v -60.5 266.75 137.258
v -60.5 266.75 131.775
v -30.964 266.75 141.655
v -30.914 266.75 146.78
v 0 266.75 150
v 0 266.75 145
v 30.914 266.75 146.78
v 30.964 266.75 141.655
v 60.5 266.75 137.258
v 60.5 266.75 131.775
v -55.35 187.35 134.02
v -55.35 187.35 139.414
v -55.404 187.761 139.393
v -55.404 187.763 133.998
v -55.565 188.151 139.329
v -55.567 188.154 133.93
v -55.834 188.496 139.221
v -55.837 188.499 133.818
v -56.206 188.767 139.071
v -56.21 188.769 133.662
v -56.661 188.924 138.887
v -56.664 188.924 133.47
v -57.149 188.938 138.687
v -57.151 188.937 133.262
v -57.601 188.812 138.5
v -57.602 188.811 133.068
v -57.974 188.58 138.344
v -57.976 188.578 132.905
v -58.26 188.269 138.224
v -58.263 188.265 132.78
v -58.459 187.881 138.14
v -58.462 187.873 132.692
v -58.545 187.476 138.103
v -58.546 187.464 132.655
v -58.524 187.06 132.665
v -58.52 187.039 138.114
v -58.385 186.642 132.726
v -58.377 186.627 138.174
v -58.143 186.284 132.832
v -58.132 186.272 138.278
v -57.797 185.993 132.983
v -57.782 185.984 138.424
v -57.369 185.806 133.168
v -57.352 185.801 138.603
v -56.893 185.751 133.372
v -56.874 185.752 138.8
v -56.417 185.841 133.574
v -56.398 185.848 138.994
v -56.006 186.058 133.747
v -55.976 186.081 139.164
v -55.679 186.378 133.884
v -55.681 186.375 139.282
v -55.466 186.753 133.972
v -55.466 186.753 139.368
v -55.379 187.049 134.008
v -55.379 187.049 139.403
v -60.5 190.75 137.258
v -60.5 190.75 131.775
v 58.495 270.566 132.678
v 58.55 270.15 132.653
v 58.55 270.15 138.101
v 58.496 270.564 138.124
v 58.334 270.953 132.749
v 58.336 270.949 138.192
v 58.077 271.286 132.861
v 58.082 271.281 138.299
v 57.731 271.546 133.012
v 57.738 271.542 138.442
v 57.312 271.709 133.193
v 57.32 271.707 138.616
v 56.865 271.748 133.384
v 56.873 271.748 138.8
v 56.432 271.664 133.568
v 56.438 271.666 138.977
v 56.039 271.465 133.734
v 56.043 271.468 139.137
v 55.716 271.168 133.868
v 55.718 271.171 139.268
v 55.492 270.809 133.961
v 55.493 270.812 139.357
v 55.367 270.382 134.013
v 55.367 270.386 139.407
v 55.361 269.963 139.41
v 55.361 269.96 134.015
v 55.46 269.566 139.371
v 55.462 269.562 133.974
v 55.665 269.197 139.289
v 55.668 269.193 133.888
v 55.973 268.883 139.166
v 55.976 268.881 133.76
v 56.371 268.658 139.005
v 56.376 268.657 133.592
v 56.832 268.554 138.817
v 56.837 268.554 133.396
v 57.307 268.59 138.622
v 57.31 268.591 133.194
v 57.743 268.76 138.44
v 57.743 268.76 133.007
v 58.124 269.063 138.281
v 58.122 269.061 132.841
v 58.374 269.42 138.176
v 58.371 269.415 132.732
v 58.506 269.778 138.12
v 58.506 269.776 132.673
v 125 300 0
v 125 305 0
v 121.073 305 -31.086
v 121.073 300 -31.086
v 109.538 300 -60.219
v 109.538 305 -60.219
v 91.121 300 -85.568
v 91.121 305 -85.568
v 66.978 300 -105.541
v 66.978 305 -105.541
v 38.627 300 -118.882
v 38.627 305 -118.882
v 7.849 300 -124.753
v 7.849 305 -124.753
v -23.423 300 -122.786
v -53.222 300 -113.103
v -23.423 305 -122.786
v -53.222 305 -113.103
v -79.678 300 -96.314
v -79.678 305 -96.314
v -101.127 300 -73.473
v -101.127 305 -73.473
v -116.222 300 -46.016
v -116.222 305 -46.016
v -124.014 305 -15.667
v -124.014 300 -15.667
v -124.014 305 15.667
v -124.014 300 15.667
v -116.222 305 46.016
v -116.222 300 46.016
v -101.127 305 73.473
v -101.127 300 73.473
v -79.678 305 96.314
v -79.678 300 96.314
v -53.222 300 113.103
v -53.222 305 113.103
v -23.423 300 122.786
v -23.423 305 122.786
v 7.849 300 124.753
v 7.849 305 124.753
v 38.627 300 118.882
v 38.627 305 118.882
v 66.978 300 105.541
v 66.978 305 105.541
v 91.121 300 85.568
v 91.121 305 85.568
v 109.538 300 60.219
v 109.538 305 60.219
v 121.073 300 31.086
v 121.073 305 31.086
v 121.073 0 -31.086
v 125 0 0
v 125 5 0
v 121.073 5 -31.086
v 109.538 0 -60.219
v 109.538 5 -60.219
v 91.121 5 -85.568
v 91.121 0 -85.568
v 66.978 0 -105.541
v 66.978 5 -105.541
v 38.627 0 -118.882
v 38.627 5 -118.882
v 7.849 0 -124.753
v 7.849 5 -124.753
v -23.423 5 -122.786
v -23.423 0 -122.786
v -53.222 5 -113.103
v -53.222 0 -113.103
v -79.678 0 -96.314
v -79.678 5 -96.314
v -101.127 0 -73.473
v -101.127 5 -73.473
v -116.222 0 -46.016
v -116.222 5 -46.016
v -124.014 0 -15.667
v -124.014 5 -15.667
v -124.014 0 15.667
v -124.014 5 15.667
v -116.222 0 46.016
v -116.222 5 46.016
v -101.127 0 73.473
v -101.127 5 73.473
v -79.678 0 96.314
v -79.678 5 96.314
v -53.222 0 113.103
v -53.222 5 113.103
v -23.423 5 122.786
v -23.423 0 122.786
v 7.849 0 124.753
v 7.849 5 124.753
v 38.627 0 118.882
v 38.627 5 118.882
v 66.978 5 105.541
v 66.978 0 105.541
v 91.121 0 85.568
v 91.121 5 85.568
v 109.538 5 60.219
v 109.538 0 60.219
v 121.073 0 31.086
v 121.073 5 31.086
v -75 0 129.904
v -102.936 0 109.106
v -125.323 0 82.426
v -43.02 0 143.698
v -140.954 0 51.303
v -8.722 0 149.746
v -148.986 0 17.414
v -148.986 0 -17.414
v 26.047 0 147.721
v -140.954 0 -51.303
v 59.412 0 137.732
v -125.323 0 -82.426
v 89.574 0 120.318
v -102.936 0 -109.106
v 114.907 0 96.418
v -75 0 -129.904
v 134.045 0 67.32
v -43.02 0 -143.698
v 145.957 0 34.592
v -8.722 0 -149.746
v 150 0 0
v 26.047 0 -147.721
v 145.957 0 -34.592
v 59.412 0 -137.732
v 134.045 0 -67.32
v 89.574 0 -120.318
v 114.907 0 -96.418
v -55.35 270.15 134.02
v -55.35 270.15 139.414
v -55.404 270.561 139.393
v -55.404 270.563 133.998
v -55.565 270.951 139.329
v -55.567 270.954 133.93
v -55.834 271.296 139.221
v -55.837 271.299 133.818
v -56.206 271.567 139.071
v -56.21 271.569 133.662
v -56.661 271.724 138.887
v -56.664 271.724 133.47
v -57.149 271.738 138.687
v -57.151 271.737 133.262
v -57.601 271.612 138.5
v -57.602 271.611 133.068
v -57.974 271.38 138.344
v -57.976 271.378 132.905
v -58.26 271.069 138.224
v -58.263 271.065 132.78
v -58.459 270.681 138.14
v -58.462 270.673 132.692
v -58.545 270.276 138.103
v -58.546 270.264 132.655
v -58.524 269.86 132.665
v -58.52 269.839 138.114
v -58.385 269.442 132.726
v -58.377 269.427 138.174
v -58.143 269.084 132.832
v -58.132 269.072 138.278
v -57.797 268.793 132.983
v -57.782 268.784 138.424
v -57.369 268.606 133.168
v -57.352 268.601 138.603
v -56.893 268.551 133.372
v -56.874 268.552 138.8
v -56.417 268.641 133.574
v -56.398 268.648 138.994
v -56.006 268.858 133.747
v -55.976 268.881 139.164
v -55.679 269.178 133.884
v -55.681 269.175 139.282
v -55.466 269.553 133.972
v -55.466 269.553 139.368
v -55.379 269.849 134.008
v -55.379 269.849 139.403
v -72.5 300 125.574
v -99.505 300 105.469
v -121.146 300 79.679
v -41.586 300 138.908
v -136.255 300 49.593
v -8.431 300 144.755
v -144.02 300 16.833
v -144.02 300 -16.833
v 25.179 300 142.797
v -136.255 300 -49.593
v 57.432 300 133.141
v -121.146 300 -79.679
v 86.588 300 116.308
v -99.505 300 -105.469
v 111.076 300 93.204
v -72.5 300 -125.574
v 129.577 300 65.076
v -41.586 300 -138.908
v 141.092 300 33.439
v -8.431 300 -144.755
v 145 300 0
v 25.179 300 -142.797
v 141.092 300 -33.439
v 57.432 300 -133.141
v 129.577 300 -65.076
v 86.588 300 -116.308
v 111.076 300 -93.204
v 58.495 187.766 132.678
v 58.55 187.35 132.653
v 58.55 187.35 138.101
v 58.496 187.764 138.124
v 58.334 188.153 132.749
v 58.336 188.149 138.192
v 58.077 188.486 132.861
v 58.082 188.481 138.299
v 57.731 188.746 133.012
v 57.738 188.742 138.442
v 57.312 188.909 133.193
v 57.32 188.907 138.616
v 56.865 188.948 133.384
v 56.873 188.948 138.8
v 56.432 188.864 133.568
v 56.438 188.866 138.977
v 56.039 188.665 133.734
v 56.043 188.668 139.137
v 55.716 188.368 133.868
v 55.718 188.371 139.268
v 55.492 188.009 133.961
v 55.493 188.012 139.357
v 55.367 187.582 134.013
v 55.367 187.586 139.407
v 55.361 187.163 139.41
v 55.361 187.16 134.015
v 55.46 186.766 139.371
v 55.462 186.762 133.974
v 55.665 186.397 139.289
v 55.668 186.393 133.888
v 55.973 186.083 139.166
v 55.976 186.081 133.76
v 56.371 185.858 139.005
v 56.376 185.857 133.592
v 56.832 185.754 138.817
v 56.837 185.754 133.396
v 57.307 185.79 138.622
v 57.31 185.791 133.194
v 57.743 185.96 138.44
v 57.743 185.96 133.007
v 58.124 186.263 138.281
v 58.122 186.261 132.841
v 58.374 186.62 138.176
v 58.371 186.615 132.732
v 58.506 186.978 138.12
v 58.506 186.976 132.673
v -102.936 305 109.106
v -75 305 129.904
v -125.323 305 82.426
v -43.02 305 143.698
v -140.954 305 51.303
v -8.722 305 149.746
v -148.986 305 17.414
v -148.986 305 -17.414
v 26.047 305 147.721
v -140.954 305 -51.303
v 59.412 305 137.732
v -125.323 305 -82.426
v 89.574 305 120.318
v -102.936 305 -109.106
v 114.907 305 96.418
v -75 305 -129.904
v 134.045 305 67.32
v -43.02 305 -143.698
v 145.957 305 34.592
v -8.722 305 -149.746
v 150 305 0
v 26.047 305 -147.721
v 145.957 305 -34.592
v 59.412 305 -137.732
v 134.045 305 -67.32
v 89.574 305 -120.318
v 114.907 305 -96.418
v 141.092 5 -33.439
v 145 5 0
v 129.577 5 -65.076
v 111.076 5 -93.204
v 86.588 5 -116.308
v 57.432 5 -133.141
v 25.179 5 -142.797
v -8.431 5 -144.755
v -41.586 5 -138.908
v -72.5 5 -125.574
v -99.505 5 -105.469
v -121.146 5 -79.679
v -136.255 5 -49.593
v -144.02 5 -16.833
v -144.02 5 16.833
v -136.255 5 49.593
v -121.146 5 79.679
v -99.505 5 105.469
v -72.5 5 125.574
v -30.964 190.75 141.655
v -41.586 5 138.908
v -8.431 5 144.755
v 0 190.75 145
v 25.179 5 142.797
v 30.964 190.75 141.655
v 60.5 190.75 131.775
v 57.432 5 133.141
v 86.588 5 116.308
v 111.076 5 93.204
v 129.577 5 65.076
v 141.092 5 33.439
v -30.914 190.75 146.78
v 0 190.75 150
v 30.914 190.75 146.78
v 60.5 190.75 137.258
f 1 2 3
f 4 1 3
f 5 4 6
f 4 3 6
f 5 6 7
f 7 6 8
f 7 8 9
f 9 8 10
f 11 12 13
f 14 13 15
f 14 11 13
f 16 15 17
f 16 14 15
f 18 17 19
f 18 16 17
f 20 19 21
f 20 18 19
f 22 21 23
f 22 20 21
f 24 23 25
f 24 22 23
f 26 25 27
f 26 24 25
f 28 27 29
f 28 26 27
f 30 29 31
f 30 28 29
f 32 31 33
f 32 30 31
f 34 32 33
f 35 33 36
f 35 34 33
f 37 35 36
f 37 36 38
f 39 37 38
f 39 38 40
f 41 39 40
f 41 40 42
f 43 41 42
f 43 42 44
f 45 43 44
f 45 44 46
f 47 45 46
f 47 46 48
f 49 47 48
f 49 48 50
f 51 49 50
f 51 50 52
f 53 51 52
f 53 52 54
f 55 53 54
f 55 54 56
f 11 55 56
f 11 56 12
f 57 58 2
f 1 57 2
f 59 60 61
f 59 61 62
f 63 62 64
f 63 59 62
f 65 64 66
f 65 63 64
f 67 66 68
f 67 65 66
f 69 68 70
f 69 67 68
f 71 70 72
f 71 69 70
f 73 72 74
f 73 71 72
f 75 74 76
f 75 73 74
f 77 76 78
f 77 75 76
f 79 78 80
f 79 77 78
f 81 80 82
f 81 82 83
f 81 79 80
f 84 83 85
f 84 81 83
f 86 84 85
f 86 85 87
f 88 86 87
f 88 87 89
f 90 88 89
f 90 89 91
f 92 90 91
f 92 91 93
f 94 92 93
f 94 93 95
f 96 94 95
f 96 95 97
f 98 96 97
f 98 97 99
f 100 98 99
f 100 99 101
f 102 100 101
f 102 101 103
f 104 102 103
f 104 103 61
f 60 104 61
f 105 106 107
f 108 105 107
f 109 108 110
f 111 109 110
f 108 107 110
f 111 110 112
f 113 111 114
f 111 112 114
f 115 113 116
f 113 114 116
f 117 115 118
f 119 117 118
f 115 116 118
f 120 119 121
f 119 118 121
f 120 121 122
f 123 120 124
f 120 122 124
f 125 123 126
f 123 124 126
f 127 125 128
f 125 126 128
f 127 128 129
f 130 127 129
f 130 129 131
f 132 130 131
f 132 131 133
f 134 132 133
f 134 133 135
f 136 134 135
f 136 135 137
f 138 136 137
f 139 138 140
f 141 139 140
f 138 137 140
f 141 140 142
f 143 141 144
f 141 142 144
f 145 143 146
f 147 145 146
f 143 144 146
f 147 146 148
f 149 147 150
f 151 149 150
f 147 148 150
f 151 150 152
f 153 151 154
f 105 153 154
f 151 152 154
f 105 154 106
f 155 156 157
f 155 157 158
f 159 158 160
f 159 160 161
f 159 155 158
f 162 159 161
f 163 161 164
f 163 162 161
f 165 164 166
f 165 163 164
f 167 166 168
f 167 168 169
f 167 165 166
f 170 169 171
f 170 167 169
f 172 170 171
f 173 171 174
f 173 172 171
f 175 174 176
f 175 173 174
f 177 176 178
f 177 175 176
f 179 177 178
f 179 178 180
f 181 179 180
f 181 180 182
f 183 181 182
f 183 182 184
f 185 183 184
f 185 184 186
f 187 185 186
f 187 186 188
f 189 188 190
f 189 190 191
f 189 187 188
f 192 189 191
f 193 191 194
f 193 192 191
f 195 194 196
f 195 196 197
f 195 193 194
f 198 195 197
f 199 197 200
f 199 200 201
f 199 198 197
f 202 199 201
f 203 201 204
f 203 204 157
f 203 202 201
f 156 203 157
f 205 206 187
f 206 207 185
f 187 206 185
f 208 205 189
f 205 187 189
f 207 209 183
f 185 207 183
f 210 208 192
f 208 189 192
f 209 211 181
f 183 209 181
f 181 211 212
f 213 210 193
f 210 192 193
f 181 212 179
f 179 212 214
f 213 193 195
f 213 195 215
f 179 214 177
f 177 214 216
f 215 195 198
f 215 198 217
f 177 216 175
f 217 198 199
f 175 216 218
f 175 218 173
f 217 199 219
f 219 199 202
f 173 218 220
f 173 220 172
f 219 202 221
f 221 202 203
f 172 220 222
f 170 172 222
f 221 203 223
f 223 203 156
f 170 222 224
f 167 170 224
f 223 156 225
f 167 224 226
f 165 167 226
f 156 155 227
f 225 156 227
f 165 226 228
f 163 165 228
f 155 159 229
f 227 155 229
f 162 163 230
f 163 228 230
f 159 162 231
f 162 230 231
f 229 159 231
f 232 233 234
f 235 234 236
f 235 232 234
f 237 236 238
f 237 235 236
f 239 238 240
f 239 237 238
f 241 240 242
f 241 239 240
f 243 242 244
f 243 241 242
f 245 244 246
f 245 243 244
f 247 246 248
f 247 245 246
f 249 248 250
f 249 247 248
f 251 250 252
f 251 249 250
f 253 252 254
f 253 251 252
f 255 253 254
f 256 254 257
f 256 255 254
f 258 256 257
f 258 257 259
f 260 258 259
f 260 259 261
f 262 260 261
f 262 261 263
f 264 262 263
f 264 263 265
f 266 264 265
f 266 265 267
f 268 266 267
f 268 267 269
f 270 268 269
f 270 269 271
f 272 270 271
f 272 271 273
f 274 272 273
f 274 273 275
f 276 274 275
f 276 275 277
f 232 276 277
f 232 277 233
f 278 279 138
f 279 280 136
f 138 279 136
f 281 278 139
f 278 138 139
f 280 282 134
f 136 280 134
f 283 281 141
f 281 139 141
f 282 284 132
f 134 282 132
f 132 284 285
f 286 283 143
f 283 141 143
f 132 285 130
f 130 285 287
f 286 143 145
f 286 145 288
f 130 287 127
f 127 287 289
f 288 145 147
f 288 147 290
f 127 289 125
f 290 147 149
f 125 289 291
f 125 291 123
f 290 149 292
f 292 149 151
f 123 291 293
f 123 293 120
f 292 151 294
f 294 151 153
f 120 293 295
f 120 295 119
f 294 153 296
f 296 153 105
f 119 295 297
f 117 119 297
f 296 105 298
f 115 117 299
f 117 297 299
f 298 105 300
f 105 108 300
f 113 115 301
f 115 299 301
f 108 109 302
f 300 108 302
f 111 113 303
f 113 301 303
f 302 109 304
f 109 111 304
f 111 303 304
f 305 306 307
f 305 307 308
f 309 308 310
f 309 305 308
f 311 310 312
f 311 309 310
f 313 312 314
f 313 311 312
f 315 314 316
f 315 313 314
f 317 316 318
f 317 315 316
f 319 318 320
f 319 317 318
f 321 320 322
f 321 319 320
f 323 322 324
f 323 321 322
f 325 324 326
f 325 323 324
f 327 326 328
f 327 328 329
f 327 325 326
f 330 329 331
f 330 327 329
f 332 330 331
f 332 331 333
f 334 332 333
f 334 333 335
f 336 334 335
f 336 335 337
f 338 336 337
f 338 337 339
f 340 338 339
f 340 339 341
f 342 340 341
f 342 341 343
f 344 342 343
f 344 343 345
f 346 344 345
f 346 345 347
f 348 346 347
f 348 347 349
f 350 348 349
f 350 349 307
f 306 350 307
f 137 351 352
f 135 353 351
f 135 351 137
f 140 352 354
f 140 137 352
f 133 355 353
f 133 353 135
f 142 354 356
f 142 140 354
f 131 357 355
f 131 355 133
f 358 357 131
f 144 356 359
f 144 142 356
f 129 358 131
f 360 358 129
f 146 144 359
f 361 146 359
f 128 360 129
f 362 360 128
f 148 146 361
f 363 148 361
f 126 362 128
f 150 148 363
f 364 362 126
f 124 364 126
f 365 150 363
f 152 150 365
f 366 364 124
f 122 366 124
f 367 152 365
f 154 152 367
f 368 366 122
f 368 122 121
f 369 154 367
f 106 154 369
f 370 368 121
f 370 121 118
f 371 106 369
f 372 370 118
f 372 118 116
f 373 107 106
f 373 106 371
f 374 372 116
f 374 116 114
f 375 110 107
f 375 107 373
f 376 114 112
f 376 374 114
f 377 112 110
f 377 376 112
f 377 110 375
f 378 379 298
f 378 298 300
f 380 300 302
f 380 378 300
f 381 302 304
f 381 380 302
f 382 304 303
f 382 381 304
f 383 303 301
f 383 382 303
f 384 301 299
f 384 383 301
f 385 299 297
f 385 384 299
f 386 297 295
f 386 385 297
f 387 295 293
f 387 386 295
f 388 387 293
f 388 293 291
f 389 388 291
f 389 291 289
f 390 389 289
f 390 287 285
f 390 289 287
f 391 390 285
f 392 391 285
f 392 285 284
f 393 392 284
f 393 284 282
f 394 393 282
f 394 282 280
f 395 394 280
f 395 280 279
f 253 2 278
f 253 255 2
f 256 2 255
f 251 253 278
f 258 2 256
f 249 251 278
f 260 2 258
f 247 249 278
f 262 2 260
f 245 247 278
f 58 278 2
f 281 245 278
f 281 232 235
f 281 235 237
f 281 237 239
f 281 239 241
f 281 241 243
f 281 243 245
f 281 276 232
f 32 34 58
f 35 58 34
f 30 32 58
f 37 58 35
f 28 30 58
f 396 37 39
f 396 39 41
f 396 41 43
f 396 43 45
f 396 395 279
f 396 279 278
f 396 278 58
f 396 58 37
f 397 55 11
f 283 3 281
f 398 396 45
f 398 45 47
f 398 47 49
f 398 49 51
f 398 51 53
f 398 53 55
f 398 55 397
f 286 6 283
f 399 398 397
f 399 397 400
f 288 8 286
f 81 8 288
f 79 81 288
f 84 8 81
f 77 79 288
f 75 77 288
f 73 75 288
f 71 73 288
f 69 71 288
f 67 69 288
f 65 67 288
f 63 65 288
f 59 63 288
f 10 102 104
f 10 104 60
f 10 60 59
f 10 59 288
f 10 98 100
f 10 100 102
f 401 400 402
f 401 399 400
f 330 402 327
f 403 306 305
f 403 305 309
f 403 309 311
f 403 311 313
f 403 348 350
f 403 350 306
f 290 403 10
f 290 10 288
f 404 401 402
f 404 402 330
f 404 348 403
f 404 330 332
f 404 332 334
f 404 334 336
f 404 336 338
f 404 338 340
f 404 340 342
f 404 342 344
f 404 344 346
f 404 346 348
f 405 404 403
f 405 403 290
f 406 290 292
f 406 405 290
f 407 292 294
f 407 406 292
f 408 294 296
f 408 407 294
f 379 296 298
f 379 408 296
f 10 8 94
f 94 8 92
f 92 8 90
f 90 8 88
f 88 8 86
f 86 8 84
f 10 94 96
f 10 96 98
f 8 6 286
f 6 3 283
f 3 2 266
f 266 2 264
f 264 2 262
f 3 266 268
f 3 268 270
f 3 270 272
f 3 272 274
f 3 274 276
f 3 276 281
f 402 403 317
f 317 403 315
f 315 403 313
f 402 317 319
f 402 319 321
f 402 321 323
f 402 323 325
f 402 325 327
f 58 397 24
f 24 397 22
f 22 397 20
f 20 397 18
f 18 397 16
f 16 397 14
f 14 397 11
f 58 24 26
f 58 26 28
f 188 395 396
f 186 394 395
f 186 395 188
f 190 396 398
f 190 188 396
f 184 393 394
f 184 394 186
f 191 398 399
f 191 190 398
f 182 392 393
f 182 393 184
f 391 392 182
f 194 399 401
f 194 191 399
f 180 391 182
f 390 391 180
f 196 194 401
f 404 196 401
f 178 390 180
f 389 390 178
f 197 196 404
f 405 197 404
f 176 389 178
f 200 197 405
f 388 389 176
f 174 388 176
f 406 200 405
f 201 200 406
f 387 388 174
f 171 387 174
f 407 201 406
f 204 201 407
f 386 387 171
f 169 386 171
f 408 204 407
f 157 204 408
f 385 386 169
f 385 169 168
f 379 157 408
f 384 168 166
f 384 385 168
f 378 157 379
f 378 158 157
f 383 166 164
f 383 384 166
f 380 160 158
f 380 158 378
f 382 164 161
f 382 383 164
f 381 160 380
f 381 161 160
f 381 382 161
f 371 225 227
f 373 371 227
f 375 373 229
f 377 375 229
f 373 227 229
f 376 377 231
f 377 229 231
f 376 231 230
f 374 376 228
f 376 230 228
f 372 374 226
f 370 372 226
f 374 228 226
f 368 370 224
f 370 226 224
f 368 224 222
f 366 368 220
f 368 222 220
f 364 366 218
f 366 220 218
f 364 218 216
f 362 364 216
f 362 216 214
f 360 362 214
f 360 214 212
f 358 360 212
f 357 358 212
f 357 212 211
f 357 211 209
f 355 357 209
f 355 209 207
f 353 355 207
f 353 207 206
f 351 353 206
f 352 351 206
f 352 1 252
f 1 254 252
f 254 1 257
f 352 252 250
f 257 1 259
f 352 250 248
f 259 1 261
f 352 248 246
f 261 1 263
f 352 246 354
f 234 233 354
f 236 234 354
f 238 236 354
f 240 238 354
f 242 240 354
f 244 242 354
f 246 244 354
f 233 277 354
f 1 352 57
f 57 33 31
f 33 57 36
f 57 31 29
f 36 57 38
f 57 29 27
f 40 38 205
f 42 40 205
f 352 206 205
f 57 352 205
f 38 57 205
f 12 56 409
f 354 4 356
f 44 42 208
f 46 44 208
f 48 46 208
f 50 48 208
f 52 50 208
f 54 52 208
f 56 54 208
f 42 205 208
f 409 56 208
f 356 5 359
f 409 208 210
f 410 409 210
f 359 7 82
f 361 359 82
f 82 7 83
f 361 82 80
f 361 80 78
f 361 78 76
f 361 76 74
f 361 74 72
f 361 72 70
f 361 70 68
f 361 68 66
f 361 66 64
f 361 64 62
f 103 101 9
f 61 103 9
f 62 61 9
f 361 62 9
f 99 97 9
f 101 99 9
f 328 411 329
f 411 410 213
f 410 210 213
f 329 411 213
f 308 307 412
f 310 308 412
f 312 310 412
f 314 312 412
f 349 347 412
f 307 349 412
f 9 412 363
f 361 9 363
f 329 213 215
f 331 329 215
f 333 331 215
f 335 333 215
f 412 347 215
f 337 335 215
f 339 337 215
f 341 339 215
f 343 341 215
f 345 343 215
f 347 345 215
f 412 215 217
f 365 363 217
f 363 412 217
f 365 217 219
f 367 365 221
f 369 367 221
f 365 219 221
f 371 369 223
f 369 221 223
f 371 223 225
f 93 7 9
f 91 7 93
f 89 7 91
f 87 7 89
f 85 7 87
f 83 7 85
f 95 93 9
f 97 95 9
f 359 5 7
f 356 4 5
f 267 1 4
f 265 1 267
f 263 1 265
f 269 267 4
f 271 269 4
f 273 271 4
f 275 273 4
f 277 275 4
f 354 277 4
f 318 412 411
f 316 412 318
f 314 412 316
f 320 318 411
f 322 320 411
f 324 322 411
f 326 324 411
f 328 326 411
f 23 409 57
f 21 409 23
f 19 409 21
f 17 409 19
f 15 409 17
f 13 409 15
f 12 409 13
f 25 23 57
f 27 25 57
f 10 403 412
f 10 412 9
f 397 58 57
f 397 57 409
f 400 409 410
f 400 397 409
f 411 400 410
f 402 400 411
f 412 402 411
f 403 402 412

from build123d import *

# Parameters (mm, degrees)
SKETCH1_R           = 150
SKETCH1_R_2         = 125
BOSS_EXTRUDE1_DEPTH = 5
SKETCH2_R           = 150
SKETCH2_R_2         = 145
BOSS_EXTRUDE2_DEPTH = 300
SKETCH3_R           = 150
SKETCH3_R_2         = 125
BOSS_EXTRUDE3_DEPTH = 5
CUT_EXTRUDE1_REACH  = 152
SKETCH5_W           = 121
SKETCH5_H           = 76
CUT_EXTRUDE2_REACH  = 152
SKETCH7_R           = 1.6


with BuildPart() as part:
    # Sketch1 → Boss-Extrude1 (new body)
    with BuildSketch(Plane(origin=(0, 0, 0), x_dir=(1, 0, 0), z_dir=(0, 1, 0))):
        Circle(SKETCH1_R)
        Circle(SKETCH1_R_2, mode=Mode.SUBTRACT)
    extrude(amount=BOSS_EXTRUDE1_DEPTH)

    # Sketch2 → Boss-Extrude2 (add)
    with BuildSketch(Plane(origin=(0, 5, 0), x_dir=(1, 0, 0), z_dir=(0, 1, 0))):
        Circle(SKETCH2_R)
        Circle(SKETCH2_R_2, mode=Mode.SUBTRACT)
    extrude(amount=BOSS_EXTRUDE2_DEPTH)

    # Sketch3 → Boss-Extrude3 (add)
    with BuildSketch(Plane(origin=(0, 305, 0), x_dir=(1, 0, 0), z_dir=(0, 1, 0))):
        Circle(SKETCH3_R)
        Circle(SKETCH3_R_2, mode=Mode.SUBTRACT)
    extrude(amount=-BOSS_EXTRUDE3_DEPTH)

    # Sketch5 → Cut-Extrude1 (cut, up to next)
    with BuildSketch(Plane.XY, mode=Mode.PRIVATE) as cut_extrude1_sk1:
        with Locations((0, 228.75)):
            Rectangle(SKETCH5_W, SKETCH5_H)
    cut_extrude1_tool1 = extrude(cut_extrude1_sk1.sketch, amount=CUT_EXTRUDE1_REACH, mode=Mode.PRIVATE) & part.part
    add(cut_extrude1_tool1.solids().sort_by_distance((0, 228.75, 0))[0], mode=Mode.SUBTRACT)

    # Sketch7 → Cut-Extrude2 (cut, up to next)
    with BuildSketch(Plane.XY, mode=Mode.PRIVATE) as cut_extrude2_sk1:
        with Locations((56.95, 270.15)):
            Circle(SKETCH7_R)
    cut_extrude2_tool1 = extrude(cut_extrude2_sk1.sketch, amount=CUT_EXTRUDE2_REACH, mode=Mode.PRIVATE) & part.part
    add(cut_extrude2_tool1.solids().sort_by_distance((56.95, 270.15, 0))[0], mode=Mode.SUBTRACT)
    # Sketch7 → Cut-Extrude2 (cut, up to next)
    with BuildSketch(Plane.XY, mode=Mode.PRIVATE) as cut_extrude2_sk2:
        with Locations((56.95, 187.35)):
            Circle(SKETCH7_R)
    cut_extrude2_tool2 = extrude(cut_extrude2_sk2.sketch, amount=CUT_EXTRUDE2_REACH, mode=Mode.PRIVATE) & part.part
    add(cut_extrude2_tool2.solids().sort_by_distance((56.95, 187.35, 0))[0], mode=Mode.SUBTRACT)
    # Sketch7 → Cut-Extrude2 (cut, up to next)
    with BuildSketch(Plane.XY, mode=Mode.PRIVATE) as cut_extrude2_sk3:
        with Locations((-56.95, 270.15)):
            Circle(SKETCH7_R)
    cut_extrude2_tool3 = extrude(cut_extrude2_sk3.sketch, amount=CUT_EXTRUDE2_REACH, mode=Mode.PRIVATE) & part.part
    add(cut_extrude2_tool3.solids().sort_by_distance((-56.95, 270.15, 0))[0], mode=Mode.SUBTRACT)
    # Sketch7 → Cut-Extrude2 (cut, up to next)
    with BuildSketch(Plane.XY, mode=Mode.PRIVATE) as cut_extrude2_sk4:
        with Locations((-56.95, 187.35)):
            Circle(SKETCH7_R)
    cut_extrude2_tool4 = extrude(cut_extrude2_sk4.sketch, amount=CUT_EXTRUDE2_REACH, mode=Mode.PRIVATE) & part.part
    add(cut_extrude2_tool4.solids().sort_by_distance((-56.95, 187.35, 0))[0], mode=Mode.SUBTRACT)


solid = part.part
